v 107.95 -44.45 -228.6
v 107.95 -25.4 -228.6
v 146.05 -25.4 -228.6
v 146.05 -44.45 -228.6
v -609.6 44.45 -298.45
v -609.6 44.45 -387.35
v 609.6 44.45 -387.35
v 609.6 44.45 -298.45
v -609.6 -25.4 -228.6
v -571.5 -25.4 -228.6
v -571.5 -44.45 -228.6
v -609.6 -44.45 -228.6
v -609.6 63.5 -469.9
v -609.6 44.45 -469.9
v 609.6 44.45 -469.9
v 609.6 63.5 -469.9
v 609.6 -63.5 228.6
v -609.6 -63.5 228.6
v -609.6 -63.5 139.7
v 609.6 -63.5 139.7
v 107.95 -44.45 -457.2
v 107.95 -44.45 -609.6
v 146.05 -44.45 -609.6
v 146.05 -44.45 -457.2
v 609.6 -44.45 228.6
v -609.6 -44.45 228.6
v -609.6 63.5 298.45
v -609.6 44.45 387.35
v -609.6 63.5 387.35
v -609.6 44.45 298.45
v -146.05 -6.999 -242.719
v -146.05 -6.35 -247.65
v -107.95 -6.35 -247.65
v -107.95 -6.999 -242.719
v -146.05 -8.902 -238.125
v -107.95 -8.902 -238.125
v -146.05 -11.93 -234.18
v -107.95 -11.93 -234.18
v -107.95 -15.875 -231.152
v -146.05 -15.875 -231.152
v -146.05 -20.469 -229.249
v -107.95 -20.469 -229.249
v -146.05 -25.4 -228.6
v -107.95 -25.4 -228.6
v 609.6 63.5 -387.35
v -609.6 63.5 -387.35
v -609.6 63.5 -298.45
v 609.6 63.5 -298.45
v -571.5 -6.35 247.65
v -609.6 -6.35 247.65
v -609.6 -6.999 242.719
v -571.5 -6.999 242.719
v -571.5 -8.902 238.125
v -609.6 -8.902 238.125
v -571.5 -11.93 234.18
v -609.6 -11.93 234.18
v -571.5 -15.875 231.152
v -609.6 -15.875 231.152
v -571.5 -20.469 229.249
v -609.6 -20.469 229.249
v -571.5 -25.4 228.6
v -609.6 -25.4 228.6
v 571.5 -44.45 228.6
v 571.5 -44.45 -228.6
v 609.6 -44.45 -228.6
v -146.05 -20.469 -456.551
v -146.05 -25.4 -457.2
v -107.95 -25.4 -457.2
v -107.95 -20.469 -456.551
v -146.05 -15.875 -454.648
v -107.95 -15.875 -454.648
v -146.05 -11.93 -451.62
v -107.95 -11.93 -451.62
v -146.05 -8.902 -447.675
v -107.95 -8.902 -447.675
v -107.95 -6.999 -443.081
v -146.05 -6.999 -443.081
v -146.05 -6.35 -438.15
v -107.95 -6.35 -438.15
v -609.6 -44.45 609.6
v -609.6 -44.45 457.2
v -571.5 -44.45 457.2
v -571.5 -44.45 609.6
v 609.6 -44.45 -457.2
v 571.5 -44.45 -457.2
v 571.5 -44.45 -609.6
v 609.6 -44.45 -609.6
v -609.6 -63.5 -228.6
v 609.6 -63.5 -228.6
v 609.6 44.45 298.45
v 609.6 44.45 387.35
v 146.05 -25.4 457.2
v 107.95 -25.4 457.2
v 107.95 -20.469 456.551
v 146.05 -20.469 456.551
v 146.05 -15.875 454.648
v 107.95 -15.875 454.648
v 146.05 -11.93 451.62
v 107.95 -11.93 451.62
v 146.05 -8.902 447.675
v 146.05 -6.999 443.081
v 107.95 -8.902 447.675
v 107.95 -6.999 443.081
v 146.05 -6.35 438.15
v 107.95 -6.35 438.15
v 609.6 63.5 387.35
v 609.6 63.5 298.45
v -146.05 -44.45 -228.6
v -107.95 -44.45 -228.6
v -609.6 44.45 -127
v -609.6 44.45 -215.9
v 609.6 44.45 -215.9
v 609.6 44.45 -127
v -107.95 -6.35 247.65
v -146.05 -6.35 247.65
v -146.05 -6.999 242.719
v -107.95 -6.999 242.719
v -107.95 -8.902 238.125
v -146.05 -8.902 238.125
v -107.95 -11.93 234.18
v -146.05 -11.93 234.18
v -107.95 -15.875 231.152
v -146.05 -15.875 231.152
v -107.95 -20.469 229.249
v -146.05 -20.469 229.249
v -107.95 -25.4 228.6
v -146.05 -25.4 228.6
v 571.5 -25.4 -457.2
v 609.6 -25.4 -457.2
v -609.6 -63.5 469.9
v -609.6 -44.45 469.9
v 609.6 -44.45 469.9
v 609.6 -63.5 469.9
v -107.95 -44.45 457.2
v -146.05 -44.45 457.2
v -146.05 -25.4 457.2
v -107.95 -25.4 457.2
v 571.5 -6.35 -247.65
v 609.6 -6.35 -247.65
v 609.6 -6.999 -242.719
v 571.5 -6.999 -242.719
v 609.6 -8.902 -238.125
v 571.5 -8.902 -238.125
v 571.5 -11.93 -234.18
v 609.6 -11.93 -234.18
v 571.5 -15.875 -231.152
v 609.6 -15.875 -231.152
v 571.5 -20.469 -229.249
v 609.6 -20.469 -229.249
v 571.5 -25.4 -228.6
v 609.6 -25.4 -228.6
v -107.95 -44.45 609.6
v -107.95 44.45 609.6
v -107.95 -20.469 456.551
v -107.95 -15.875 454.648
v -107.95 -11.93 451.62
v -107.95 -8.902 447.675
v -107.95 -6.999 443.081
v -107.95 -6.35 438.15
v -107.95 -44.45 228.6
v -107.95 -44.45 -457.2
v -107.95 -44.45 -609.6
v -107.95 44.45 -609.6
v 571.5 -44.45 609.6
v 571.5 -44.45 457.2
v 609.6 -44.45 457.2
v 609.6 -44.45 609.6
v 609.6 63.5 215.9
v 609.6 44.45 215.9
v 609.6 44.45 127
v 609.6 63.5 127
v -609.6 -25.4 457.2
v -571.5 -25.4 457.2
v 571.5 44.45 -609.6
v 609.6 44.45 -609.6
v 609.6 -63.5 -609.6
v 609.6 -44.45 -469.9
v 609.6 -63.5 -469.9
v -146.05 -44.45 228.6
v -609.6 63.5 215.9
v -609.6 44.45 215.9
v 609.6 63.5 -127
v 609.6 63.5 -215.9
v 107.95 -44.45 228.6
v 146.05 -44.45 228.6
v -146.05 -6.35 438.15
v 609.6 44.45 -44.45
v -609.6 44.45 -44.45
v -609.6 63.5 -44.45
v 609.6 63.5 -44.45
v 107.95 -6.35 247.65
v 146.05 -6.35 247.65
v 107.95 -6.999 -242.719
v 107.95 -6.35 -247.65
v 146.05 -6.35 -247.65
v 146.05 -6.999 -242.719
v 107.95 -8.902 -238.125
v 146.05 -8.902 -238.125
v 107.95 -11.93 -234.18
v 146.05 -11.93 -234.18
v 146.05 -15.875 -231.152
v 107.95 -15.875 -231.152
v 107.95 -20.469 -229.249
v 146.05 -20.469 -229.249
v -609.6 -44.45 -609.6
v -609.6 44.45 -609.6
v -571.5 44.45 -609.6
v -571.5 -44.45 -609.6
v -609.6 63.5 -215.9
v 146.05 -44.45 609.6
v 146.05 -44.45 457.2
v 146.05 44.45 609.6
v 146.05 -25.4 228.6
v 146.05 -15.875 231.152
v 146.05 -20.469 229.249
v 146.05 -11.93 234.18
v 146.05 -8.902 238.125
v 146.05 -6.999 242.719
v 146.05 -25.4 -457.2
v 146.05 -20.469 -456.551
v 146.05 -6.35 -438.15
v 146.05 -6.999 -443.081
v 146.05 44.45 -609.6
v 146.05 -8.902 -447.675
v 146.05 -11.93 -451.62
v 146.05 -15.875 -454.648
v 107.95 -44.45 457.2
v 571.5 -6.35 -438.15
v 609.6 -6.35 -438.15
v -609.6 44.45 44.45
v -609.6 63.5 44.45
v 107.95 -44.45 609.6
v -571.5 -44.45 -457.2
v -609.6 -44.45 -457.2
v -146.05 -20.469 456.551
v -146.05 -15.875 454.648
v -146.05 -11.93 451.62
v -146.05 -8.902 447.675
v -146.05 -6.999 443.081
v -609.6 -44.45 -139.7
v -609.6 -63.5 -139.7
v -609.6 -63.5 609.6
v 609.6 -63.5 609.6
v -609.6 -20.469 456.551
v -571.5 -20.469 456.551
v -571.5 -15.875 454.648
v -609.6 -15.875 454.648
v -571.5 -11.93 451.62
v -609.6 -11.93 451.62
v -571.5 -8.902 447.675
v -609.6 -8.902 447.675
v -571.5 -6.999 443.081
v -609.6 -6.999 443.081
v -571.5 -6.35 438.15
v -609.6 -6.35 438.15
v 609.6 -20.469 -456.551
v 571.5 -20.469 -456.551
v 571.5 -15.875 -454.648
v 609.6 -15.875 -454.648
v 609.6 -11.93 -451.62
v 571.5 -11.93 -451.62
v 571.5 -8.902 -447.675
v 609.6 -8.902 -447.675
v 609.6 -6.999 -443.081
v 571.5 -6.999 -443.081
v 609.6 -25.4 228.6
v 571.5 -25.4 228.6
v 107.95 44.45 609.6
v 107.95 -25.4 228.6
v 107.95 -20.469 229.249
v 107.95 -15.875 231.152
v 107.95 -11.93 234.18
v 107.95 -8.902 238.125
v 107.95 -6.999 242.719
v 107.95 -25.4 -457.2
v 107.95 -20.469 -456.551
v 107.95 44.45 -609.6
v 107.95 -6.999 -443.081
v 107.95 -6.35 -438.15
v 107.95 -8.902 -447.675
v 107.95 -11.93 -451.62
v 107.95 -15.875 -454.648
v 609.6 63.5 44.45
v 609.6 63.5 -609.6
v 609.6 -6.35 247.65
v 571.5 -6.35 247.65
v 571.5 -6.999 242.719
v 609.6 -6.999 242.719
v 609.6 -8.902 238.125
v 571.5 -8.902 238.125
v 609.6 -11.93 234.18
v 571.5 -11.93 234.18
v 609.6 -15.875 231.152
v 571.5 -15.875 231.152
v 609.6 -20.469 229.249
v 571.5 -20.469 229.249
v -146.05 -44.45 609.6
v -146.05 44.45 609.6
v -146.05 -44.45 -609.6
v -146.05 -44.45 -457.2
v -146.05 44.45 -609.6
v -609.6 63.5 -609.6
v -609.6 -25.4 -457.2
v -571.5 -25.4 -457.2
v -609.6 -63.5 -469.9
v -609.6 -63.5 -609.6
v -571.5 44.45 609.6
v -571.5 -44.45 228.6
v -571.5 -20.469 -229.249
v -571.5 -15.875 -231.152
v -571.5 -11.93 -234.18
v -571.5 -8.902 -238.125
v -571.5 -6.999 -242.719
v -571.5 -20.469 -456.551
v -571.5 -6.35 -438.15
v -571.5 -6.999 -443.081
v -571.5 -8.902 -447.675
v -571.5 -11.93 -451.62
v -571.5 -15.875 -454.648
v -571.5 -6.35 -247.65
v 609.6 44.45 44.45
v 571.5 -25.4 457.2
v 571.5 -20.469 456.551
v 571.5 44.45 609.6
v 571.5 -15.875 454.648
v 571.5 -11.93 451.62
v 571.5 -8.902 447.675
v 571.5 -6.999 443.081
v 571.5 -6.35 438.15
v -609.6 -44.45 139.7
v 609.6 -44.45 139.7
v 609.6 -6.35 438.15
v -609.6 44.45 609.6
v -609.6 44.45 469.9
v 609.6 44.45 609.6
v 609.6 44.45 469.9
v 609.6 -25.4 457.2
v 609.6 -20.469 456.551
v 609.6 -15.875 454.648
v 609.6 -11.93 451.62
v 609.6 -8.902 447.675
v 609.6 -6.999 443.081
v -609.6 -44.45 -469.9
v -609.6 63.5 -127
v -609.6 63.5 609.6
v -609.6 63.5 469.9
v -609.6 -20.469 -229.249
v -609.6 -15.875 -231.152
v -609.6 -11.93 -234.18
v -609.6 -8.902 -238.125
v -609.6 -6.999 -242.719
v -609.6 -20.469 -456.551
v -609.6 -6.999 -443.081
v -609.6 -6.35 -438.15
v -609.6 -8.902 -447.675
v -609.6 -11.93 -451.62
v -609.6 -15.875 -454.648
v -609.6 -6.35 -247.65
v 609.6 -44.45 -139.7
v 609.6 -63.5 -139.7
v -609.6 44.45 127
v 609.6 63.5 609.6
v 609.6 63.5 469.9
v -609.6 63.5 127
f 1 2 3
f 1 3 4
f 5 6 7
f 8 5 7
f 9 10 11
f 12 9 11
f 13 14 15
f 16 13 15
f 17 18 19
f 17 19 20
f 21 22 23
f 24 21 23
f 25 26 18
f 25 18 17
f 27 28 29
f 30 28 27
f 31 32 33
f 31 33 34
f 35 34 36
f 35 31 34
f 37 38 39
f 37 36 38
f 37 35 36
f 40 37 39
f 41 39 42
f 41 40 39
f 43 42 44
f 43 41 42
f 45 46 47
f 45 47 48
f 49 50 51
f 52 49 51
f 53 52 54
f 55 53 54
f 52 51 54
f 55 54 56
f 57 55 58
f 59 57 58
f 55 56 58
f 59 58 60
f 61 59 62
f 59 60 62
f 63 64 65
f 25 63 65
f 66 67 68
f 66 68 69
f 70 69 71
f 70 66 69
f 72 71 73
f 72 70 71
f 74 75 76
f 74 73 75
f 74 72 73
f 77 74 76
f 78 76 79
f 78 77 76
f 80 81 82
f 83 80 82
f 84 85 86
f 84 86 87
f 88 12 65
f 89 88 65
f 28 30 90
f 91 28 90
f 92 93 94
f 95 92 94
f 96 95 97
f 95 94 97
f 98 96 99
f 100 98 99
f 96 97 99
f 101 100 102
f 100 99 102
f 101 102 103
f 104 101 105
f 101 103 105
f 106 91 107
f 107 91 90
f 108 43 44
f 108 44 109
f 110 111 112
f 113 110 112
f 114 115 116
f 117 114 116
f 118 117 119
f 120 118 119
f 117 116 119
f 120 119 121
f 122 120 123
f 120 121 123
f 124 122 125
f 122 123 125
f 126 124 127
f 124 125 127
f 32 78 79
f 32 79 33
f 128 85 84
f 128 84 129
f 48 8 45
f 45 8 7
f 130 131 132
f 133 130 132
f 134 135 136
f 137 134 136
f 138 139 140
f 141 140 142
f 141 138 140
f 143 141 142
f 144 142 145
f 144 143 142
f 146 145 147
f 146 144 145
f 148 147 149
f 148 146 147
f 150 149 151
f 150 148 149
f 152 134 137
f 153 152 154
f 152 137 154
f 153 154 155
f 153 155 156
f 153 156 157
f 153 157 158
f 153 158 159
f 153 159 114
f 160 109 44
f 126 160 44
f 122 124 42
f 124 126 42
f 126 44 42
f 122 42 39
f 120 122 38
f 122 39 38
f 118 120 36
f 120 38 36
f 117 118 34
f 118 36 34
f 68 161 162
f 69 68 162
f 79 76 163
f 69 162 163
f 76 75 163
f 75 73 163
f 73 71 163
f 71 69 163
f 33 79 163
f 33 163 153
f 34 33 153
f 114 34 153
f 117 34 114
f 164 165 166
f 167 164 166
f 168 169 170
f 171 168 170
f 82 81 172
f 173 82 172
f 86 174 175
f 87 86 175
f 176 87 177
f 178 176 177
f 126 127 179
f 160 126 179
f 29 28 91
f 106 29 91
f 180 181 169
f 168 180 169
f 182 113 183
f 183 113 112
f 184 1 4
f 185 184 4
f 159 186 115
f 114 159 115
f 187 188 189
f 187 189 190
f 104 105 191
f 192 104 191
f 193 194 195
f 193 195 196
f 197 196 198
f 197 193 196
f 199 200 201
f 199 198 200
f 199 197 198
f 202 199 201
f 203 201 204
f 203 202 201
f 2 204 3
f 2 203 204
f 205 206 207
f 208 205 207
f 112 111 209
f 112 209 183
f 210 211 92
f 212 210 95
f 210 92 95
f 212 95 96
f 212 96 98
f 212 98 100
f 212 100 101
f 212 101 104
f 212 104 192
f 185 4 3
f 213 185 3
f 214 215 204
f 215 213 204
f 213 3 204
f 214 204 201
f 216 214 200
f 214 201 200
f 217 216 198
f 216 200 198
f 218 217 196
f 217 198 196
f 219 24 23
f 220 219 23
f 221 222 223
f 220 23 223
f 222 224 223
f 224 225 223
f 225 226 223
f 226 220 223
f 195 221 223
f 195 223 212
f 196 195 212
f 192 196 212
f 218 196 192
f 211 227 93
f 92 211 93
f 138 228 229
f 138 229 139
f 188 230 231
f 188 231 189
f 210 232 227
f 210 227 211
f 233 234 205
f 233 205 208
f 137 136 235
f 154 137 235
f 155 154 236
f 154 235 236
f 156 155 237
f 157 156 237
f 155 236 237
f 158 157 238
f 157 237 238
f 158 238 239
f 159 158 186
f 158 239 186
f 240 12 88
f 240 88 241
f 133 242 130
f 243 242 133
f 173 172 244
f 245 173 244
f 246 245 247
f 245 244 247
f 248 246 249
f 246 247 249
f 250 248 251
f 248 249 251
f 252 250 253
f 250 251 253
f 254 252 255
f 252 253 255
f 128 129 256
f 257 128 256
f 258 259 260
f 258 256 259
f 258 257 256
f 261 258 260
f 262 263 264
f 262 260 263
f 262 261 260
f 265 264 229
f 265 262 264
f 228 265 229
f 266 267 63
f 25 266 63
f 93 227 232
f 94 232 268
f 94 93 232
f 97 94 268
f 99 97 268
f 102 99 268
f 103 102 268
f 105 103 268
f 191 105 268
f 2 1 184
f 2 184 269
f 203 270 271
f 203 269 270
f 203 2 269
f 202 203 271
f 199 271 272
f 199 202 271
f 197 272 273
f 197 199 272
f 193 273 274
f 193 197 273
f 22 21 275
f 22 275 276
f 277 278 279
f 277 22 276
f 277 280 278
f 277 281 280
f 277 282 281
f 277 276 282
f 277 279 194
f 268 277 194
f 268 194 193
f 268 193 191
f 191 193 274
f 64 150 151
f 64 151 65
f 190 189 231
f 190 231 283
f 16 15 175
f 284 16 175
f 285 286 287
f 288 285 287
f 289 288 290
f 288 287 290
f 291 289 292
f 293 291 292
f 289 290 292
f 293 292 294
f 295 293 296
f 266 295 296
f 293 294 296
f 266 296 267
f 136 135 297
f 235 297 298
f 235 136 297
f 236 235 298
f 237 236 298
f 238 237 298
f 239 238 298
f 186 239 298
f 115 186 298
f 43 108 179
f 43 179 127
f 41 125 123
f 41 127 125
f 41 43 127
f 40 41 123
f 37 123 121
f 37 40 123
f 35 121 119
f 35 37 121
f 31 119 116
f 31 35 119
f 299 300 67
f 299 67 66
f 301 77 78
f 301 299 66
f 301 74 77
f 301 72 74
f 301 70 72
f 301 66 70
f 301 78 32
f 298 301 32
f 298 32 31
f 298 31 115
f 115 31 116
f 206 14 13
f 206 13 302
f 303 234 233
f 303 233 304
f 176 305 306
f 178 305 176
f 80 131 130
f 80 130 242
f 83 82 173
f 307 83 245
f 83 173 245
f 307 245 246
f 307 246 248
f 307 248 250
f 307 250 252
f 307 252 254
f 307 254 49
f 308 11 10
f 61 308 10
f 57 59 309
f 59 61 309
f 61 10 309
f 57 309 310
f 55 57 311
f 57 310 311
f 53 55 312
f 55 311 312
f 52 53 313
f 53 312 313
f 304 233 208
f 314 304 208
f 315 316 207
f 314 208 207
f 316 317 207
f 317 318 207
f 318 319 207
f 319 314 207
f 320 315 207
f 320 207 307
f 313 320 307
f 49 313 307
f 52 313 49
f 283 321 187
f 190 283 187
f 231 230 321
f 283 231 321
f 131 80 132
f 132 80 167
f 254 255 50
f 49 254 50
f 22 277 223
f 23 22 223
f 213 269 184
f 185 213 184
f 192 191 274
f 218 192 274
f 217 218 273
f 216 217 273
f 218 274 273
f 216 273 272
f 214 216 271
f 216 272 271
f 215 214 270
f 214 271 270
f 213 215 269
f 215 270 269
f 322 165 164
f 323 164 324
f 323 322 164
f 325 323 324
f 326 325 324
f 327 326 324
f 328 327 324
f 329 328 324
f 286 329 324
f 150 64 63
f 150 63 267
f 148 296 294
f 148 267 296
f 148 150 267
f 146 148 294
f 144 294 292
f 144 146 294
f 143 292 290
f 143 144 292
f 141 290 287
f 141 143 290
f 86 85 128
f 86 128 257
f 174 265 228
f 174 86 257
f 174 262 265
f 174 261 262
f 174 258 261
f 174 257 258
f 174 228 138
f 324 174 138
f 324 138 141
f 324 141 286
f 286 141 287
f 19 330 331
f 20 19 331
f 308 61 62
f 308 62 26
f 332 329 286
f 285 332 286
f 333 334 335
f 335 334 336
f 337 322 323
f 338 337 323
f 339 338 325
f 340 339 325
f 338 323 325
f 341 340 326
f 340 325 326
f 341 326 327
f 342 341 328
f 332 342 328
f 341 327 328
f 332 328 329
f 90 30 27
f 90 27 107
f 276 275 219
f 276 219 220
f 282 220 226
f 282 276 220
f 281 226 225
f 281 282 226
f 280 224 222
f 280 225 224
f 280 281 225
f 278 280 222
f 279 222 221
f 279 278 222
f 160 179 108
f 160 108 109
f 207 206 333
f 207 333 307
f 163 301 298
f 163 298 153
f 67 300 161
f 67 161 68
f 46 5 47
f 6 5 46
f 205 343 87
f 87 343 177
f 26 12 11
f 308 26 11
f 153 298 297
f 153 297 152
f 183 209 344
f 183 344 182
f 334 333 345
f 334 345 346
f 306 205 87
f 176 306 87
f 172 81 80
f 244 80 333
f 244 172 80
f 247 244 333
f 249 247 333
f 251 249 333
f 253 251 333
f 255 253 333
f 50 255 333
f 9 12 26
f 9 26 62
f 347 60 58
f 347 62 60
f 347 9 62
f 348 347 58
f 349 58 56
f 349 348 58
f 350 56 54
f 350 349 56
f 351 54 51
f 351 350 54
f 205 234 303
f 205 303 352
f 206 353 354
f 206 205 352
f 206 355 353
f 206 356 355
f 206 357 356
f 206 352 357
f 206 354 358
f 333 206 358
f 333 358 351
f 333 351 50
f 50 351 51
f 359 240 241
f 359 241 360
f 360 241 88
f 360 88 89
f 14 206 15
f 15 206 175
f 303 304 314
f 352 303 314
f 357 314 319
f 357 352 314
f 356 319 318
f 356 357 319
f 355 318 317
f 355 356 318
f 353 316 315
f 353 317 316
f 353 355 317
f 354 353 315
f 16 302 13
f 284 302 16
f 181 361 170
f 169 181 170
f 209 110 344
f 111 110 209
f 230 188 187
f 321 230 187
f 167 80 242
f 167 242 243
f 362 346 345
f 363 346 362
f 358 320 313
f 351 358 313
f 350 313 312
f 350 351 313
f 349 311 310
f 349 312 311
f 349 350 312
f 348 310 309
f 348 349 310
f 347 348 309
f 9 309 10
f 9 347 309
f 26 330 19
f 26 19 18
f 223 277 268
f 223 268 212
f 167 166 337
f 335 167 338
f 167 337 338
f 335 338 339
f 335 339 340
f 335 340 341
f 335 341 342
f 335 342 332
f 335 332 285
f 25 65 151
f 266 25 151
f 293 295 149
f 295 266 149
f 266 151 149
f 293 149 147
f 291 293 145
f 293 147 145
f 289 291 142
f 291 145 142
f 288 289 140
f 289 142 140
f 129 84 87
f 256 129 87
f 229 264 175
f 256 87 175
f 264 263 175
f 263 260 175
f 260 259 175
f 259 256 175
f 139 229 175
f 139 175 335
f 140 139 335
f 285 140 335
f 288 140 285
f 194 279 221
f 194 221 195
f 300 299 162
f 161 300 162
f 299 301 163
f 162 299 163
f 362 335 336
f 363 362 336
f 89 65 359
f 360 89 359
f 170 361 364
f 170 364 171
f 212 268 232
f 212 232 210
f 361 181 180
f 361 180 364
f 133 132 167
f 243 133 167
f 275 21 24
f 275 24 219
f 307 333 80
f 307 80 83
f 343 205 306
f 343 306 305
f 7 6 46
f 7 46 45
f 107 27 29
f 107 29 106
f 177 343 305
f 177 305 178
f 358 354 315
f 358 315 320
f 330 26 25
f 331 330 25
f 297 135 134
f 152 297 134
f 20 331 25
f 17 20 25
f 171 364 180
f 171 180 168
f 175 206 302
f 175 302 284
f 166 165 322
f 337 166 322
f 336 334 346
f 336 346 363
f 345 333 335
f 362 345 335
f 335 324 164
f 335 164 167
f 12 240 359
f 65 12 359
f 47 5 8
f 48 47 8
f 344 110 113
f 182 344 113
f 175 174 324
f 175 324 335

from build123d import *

# Parameters (mm, degrees)
BOSS_EXTRUDE1_DEPTH        = 609.6
BOSS_EXTRUDE1_DEPTH_BACK   = 609.6
SKETCH3_W                  = 38.1
SKETCH3_H                  = 88.9
BOSS_EXTRUDE1_2_DEPTH      = 609.6
BOSS_EXTRUDE1_2_DEPTH_BACK = 609.6
BOSS_EXTRUDE1_3_DEPTH      = 609.6
BOSS_EXTRUDE1_3_DEPTH_BACK = 609.6
BOSS_EXTRUDE1_4_DEPTH      = 609.6
BOSS_EXTRUDE1_4_DEPTH_BACK = 609.6
SKETCH4_W                  = 1219.2
SKETCH4_H                  = 139.7
BOSS_EXTRUDE2_DEPTH        = 19.05
BOSS_EXTRUDE2_2_DEPTH      = 19.05
SKETCH4_H_2                = 88.9
BOSS_EXTRUDE2_3_DEPTH      = 19.05
BOSS_EXTRUDE2_4_DEPTH      = 19.05
BOSS_EXTRUDE2_5_DEPTH      = 19.05
BOSS_EXTRUDE2_6_DEPTH      = 19.05
BOSS_EXTRUDE2_7_DEPTH      = 19.05
SKETCH5_W                  = 1219.2
SKETCH5_H                  = 139.7
BOSS_EXTRUDE3_DEPTH        = 19.05
BOSS_EXTRUDE3_2_DEPTH      = 19.05
SKETCH5_H_2                = 88.9
BOSS_EXTRUDE3_3_DEPTH      = 19.05
BOSS_EXTRUDE3_4_DEPTH      = 19.05
CUT_EXTRUDE2_DEPTH         = 1365.585303306
CUT_EXTRUDE2_DEPTH_BACK    = 1365.585303306


with BuildPart() as part:
    # Sketch3 → Boss-Extrude1 (new, two sides: drawn at the far end of the back side and taken through both)
    with BuildSketch(Plane.XY.offset(-BOSS_EXTRUDE1_DEPTH_BACK)):
        with Locations((-590.55, 0)):
            Rectangle(SKETCH3_W, SKETCH3_H)
    extrude(amount=BOSS_EXTRUDE1_DEPTH + BOSS_EXTRUDE1_DEPTH_BACK)


with BuildPart() as body_2:
    # Sketch3 → Boss-Extrude1 2 (new, two sides: drawn at the far end of the back side and taken through both)
    with BuildSketch(Plane.XY.offset(-BOSS_EXTRUDE1_2_DEPTH_BACK)):
        with Locations((127, 0)):
            Rectangle(SKETCH3_W, SKETCH3_H)
    extrude(amount=BOSS_EXTRUDE1_2_DEPTH + BOSS_EXTRUDE1_2_DEPTH_BACK)


with BuildPart() as body_3:
    # Sketch3 → Boss-Extrude1 3 (new, two sides: drawn at the far end of the back side and taken through both)
    with BuildSketch(Plane.XY.offset(-BOSS_EXTRUDE1_3_DEPTH_BACK)):
        with Locations((590.55, 0)):
            Rectangle(SKETCH3_W, SKETCH3_H)
    extrude(amount=BOSS_EXTRUDE1_3_DEPTH + BOSS_EXTRUDE1_3_DEPTH_BACK)


with BuildPart() as body_4:
    # Sketch3 → Boss-Extrude1 4 (new, two sides: drawn at the far end of the back side and taken through both)
    with BuildSketch(Plane.XY.offset(-BOSS_EXTRUDE1_4_DEPTH_BACK)):
        with Locations((-127, 0)):
            Rectangle(SKETCH3_W, SKETCH3_H)
    extrude(amount=BOSS_EXTRUDE1_4_DEPTH + BOSS_EXTRUDE1_4_DEPTH_BACK)


with BuildPart() as body_5:
    # Sketch4 → Boss-Extrude2 (new body)
    with BuildSketch(Plane(origin=(0, 44.45, 0), x_dir=(1, 0, 0), z_dir=(0, 1, 0))):
        with Locations((0, -539.75)):
            Rectangle(SKETCH4_W, SKETCH4_H)
    extrude(amount=BOSS_EXTRUDE2_DEPTH)


with BuildPart() as body_6:
    # Sketch4 → Boss-Extrude2 2 (new body)
    with BuildSketch(Plane(origin=(0, 44.45, 0), x_dir=(1, 0, 0), z_dir=(0, 1, 0))):
        with Locations((0, 539.75)):
            Rectangle(SKETCH4_W, SKETCH4_H)
    extrude(amount=BOSS_EXTRUDE2_2_DEPTH)


with BuildPart() as body_7:
    # Sketch4 → Boss-Extrude2 3 (new body)
    with BuildSketch(Plane(origin=(0, 44.45, 0), x_dir=(1, 0, 0), z_dir=(0, 1, 0))):
        with Locations((0, -342.9)):
            Rectangle(SKETCH4_W, SKETCH4_H_2)
    extrude(amount=BOSS_EXTRUDE2_3_DEPTH)


with BuildPart() as body_8:
    # Sketch4 → Boss-Extrude2 4 (new body)
    with BuildSketch(Plane(origin=(0, 44.45, 0), x_dir=(1, 0, 0), z_dir=(0, 1, 0))):
        with Locations((0, -171.45)):
            Rectangle(SKETCH4_W, SKETCH4_H_2)
    extrude(amount=BOSS_EXTRUDE2_4_DEPTH)


with BuildPart() as body_9:
    # Sketch4 → Boss-Extrude2 5 (new body)
    with BuildSketch(Plane(origin=(0, 44.45, 0), x_dir=(1, 0, 0), z_dir=(0, 1, 0))):
        with Locations((0, 342.9)):
            Rectangle(SKETCH4_W, SKETCH4_H_2)
    extrude(amount=BOSS_EXTRUDE2_5_DEPTH)


with BuildPart() as body_10:
    # Sketch4 → Boss-Extrude2 6 (new body)
    with BuildSketch(Plane(origin=(0, 44.45, 0), x_dir=(1, 0, 0), z_dir=(0, 1, 0))):
        with Locations((0, 171.45)):
            Rectangle(SKETCH4_W, SKETCH4_H_2)
    extrude(amount=BOSS_EXTRUDE2_6_DEPTH)


with BuildPart() as body_11:
    # Sketch4 → Boss-Extrude2 7 (new body)
    with BuildSketch(Plane(origin=(0, 44.45, 0), x_dir=(1, 0, 0), z_dir=(0, 1, 0))):
        Rectangle(SKETCH4_W, SKETCH4_H_2)
    extrude(amount=BOSS_EXTRUDE2_7_DEPTH)


with BuildPart() as body_12:
    # Sketch5 → Boss-Extrude3 (new body)
    with BuildSketch(Plane.XZ.offset(44.45)):
        with Locations((0, 539.75)):
            Rectangle(SKETCH5_W, SKETCH5_H)
    extrude(amount=BOSS_EXTRUDE3_DEPTH)


with BuildPart() as body_13:
    # Sketch5 → Boss-Extrude3 2 (new body)
    with BuildSketch(Plane.XZ.offset(44.45)):
        with Locations((0, -539.75)):
            Rectangle(SKETCH5_W, SKETCH5_H)
    extrude(amount=BOSS_EXTRUDE3_2_DEPTH)


with BuildPart() as body_14:
    # Sketch5 → Boss-Extrude3 3 (new body)
    with BuildSketch(Plane.XZ.offset(44.45)):
        with Locations((0, 184.15)):
            Rectangle(SKETCH5_W, SKETCH5_H_2)
    extrude(amount=BOSS_EXTRUDE3_3_DEPTH)


with BuildPart() as body_15:
    # Sketch5 → Boss-Extrude3 4 (new body)
    with BuildSketch(Plane.XZ.offset(44.45)):
        with Locations((0, -184.15)):
            Rectangle(SKETCH5_W, SKETCH5_H_2)
    extrude(amount=BOSS_EXTRUDE3_4_DEPTH)


with BuildPart() as cut_extrude2_tool:
    # Sketch8 → Cut-Extrude2 (new, two sides: drawn at the far end of the back side and taken through both)
    with BuildSketch(Plane(origin=(609.6, 0, 0), x_dir=(0, 0, -1), z_dir=(1, 0, 0)).offset(-CUT_EXTRUDE2_DEPTH_BACK)):
        with BuildLine():
            Line((-228.6, -44.45), (-457.2, -44.45))
            Line((-457.2, -44.45), (-457.2, -25.4))
            ThreePointArc((-457.2, -25.4), (-451.620384182, -11.929615818), (-438.15, -6.35))
            Line((-438.15, -6.35), (-247.65, -6.35))
            ThreePointArc((-247.65, -6.35), (-234.179615818, -11.929615818), (-228.6, -25.4))
            Line((-228.6, -25.4), (-228.6, -44.45))
        make_face()
        with BuildLine():
            Line((228.6, -44.45), (457.2, -44.45))
            Line((457.2, -44.45), (457.2, -25.4))
            ThreePointArc((457.2, -25.4), (451.620384182, -11.929615818), (438.15, -6.35))
            Line((438.15, -6.35), (247.65, -6.35))
            ThreePointArc((247.65, -6.35), (234.179615818, -11.929615818), (228.6, -25.4))
            Line((228.6, -25.4), (228.6, -44.45))
        make_face()
    extrude(amount=CUT_EXTRUDE2_DEPTH + CUT_EXTRUDE2_DEPTH_BACK)


with BuildPart() as part_1:
    add(part.part)

    # Cut-Extrude2: cut by cut_extrude2_tool
    add(cut_extrude2_tool.part, mode=Mode.SUBTRACT)


with BuildPart() as body_2_1:
    add(body_2.part)

    # Cut-Extrude2: cut by cut_extrude2_tool
    add(cut_extrude2_tool.part, mode=Mode.SUBTRACT)


with BuildPart() as body_3_1:
    add(body_3.part)

    # Cut-Extrude2: cut by cut_extrude2_tool
    add(cut_extrude2_tool.part, mode=Mode.SUBTRACT)


with BuildPart() as body_4_1:
    add(body_4.part)

    # Cut-Extrude2: cut by cut_extrude2_tool
    add(cut_extrude2_tool.part, mode=Mode.SUBTRACT)


solid = Compound([body_5.part, body_6.part, body_7.part, body_8.part, body_9.part, body_10.part, body_11.part, body_12.part, body_13.part, body_14.part, body_15.part, part_1.part, body_2_1.part, body_3_1.part, body_4_1.part])
